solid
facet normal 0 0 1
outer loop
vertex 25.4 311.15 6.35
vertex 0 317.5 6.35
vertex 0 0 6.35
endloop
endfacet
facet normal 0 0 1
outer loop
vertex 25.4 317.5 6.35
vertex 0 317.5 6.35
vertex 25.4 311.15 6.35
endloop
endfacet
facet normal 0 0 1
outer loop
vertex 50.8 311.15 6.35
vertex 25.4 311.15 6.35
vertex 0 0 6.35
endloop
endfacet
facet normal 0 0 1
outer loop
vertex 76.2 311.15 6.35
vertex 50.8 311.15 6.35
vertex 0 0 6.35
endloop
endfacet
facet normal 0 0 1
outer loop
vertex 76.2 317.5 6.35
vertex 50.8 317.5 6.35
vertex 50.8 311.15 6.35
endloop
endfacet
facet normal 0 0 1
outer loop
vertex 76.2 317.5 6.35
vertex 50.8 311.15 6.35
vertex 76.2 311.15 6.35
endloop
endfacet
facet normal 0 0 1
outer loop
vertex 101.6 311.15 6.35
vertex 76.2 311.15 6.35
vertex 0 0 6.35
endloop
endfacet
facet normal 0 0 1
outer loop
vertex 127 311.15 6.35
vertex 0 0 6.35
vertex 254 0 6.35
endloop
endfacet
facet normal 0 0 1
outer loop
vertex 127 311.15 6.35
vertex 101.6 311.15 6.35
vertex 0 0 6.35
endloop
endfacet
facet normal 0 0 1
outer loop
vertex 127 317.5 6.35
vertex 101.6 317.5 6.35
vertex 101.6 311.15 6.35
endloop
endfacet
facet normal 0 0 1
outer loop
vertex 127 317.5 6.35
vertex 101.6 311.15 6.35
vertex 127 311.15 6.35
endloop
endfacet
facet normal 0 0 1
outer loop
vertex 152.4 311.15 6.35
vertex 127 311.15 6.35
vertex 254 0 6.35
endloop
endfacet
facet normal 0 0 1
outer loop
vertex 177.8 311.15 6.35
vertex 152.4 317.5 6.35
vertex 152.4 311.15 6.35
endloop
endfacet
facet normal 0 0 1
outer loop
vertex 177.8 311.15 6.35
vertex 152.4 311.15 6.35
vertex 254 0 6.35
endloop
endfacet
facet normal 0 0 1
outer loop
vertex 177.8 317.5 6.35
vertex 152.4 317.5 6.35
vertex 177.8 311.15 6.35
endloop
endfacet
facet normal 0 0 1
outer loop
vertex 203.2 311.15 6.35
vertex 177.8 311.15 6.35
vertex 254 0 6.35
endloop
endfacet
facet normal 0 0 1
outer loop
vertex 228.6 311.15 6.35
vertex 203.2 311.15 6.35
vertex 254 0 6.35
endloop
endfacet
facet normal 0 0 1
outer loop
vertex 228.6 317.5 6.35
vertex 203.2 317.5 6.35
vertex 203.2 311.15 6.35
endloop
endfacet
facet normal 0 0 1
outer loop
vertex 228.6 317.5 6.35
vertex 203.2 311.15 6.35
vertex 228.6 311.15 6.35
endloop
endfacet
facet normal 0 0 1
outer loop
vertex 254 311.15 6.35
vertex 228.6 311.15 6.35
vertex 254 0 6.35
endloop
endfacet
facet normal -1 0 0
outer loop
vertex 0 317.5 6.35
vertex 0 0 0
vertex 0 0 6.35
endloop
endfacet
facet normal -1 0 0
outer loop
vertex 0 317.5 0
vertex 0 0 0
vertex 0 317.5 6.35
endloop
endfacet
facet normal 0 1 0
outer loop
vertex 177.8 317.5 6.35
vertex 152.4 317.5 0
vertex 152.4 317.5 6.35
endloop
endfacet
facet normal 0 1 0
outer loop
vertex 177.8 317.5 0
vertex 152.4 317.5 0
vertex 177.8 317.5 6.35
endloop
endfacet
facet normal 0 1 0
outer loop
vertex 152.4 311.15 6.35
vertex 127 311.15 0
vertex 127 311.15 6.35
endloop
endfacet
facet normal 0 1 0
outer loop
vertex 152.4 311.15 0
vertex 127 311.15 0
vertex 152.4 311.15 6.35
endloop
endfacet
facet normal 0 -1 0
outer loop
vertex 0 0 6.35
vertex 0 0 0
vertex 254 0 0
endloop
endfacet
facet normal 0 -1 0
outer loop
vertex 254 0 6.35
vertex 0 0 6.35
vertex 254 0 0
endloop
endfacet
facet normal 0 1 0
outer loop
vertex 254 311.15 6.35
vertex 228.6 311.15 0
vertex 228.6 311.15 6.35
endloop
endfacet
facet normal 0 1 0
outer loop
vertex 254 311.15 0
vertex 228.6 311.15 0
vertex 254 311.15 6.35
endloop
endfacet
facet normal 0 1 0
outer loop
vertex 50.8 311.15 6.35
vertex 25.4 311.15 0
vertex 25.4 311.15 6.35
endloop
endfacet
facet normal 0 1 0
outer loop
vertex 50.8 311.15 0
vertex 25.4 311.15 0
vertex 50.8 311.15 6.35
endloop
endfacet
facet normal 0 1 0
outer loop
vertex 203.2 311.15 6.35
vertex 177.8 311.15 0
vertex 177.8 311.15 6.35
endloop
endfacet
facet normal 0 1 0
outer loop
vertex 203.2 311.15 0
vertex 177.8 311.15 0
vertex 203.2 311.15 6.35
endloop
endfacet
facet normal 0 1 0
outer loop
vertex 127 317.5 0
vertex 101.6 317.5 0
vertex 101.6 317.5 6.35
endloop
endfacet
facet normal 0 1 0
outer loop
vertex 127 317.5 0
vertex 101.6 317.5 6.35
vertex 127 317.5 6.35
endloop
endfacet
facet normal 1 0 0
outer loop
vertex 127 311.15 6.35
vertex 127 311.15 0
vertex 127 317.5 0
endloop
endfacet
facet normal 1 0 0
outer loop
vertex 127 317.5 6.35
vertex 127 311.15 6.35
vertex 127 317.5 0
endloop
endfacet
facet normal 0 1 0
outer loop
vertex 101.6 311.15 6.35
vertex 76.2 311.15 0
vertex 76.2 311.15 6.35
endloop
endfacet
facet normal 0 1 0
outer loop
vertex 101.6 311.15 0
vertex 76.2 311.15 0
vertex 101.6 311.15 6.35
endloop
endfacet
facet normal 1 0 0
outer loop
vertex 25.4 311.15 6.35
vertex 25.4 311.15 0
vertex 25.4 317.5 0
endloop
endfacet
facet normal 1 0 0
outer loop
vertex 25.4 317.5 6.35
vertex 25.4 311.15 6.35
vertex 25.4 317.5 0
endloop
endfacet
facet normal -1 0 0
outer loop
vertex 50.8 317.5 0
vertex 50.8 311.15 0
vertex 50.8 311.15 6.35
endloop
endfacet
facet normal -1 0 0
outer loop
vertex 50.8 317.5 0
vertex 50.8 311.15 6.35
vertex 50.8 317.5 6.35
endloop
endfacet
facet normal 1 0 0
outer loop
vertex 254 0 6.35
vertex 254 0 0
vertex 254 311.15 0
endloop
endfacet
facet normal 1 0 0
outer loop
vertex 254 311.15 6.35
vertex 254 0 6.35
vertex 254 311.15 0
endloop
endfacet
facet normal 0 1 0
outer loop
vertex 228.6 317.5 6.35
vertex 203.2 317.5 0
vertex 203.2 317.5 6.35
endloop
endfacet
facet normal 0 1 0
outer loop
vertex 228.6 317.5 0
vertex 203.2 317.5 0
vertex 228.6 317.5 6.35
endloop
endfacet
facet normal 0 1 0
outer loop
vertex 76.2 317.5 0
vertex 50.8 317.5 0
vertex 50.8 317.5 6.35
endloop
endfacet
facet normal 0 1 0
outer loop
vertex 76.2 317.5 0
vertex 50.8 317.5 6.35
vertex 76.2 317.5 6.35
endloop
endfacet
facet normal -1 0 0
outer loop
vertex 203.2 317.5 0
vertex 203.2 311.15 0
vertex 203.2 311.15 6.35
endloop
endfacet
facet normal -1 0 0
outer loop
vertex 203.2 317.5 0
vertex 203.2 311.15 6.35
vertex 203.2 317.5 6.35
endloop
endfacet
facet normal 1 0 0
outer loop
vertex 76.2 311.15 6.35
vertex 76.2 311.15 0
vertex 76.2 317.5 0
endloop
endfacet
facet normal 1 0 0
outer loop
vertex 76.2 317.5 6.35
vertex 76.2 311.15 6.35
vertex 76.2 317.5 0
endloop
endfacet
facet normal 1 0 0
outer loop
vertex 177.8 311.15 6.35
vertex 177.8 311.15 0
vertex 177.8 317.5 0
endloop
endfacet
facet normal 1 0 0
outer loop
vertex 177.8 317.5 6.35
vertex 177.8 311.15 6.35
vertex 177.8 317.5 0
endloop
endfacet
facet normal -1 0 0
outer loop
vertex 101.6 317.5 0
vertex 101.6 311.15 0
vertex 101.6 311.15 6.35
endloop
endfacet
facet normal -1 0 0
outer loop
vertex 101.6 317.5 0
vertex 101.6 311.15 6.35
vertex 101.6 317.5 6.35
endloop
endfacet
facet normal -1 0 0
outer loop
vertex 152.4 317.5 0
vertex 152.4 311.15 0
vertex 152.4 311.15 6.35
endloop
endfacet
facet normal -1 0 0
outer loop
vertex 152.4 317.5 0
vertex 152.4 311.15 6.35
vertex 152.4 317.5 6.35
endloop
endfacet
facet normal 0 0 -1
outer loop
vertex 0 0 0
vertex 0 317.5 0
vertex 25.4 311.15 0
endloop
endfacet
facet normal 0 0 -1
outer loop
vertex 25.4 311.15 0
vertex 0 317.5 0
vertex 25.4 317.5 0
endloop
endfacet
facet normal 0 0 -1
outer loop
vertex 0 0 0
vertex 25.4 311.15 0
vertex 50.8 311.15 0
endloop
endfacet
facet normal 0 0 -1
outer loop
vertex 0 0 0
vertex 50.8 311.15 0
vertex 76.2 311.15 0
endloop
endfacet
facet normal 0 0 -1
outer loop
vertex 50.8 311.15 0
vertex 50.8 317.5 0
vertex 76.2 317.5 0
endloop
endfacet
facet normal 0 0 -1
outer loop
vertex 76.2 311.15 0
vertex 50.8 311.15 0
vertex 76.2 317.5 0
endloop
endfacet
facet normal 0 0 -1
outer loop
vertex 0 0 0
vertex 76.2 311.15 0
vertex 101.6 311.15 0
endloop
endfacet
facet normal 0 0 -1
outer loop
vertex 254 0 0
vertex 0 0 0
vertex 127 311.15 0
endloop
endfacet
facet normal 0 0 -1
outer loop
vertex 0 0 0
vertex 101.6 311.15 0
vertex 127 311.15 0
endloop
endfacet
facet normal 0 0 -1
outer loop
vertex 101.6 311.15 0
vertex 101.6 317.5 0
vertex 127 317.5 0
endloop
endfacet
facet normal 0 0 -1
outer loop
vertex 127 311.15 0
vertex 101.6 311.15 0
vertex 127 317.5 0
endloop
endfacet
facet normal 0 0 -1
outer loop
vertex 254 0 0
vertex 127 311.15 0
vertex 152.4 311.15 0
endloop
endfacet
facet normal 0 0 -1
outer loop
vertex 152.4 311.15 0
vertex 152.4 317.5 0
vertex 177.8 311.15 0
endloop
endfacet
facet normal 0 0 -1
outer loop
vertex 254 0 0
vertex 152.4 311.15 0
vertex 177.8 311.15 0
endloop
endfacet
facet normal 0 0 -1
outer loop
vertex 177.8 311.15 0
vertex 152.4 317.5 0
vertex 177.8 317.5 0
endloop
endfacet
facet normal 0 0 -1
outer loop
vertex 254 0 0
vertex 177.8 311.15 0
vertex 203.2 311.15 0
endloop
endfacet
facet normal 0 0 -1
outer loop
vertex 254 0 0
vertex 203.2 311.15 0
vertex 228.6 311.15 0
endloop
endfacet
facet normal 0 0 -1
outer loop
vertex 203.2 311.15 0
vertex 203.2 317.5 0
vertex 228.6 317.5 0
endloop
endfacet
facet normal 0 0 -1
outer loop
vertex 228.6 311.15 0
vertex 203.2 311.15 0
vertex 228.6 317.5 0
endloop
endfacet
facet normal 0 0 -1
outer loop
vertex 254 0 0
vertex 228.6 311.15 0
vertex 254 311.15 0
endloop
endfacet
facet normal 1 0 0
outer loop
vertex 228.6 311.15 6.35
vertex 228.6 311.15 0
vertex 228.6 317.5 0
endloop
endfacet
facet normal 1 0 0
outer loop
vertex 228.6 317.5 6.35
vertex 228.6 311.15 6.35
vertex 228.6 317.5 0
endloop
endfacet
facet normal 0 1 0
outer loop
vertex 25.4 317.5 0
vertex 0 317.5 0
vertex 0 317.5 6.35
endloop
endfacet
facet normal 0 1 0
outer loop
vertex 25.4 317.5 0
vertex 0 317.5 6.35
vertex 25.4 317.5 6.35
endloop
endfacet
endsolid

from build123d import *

# Parameters (mm, degrees)
SKETCH1_W           = 254
SKETCH1_H           = 317.5
BOSS_EXTRUDE1_DEPTH = 6.35
SKETCH2_W           = 25.4
SKETCH2_H           = 6.35
CUT_EXTRUDE1_DEPTH  = 6.35
LPATTERN1_COUNT     = 5
LPATTERN1_PITCH     = 50.8


with BuildPart() as part:
    # Sketch1 → Boss-Extrude1 (new body)
    with BuildSketch(Plane.XY):
        with Locations((127, 158.75)):
            Rectangle(SKETCH1_W, SKETCH1_H)
    extrude(amount=BOSS_EXTRUDE1_DEPTH)

    # Sketch2 → Cut-Extrude1 (cut)
    with BuildSketch(Plane.XY):
        with Locations((38.1, 314.325)):
            Rectangle(SKETCH2_W, SKETCH2_H)
    cut_extrude1 = extrude(amount=CUT_EXTRUDE1_DEPTH, mode=Mode.SUBTRACT)

    # LPattern1: Cut-Extrude1 ×5
    with Locations(*[(i * LPATTERN1_PITCH, 0, 0) for i in range(1, LPATTERN1_COUNT)]):
        add(cut_extrude1, mode=Mode.SUBTRACT)


solid = part.part
